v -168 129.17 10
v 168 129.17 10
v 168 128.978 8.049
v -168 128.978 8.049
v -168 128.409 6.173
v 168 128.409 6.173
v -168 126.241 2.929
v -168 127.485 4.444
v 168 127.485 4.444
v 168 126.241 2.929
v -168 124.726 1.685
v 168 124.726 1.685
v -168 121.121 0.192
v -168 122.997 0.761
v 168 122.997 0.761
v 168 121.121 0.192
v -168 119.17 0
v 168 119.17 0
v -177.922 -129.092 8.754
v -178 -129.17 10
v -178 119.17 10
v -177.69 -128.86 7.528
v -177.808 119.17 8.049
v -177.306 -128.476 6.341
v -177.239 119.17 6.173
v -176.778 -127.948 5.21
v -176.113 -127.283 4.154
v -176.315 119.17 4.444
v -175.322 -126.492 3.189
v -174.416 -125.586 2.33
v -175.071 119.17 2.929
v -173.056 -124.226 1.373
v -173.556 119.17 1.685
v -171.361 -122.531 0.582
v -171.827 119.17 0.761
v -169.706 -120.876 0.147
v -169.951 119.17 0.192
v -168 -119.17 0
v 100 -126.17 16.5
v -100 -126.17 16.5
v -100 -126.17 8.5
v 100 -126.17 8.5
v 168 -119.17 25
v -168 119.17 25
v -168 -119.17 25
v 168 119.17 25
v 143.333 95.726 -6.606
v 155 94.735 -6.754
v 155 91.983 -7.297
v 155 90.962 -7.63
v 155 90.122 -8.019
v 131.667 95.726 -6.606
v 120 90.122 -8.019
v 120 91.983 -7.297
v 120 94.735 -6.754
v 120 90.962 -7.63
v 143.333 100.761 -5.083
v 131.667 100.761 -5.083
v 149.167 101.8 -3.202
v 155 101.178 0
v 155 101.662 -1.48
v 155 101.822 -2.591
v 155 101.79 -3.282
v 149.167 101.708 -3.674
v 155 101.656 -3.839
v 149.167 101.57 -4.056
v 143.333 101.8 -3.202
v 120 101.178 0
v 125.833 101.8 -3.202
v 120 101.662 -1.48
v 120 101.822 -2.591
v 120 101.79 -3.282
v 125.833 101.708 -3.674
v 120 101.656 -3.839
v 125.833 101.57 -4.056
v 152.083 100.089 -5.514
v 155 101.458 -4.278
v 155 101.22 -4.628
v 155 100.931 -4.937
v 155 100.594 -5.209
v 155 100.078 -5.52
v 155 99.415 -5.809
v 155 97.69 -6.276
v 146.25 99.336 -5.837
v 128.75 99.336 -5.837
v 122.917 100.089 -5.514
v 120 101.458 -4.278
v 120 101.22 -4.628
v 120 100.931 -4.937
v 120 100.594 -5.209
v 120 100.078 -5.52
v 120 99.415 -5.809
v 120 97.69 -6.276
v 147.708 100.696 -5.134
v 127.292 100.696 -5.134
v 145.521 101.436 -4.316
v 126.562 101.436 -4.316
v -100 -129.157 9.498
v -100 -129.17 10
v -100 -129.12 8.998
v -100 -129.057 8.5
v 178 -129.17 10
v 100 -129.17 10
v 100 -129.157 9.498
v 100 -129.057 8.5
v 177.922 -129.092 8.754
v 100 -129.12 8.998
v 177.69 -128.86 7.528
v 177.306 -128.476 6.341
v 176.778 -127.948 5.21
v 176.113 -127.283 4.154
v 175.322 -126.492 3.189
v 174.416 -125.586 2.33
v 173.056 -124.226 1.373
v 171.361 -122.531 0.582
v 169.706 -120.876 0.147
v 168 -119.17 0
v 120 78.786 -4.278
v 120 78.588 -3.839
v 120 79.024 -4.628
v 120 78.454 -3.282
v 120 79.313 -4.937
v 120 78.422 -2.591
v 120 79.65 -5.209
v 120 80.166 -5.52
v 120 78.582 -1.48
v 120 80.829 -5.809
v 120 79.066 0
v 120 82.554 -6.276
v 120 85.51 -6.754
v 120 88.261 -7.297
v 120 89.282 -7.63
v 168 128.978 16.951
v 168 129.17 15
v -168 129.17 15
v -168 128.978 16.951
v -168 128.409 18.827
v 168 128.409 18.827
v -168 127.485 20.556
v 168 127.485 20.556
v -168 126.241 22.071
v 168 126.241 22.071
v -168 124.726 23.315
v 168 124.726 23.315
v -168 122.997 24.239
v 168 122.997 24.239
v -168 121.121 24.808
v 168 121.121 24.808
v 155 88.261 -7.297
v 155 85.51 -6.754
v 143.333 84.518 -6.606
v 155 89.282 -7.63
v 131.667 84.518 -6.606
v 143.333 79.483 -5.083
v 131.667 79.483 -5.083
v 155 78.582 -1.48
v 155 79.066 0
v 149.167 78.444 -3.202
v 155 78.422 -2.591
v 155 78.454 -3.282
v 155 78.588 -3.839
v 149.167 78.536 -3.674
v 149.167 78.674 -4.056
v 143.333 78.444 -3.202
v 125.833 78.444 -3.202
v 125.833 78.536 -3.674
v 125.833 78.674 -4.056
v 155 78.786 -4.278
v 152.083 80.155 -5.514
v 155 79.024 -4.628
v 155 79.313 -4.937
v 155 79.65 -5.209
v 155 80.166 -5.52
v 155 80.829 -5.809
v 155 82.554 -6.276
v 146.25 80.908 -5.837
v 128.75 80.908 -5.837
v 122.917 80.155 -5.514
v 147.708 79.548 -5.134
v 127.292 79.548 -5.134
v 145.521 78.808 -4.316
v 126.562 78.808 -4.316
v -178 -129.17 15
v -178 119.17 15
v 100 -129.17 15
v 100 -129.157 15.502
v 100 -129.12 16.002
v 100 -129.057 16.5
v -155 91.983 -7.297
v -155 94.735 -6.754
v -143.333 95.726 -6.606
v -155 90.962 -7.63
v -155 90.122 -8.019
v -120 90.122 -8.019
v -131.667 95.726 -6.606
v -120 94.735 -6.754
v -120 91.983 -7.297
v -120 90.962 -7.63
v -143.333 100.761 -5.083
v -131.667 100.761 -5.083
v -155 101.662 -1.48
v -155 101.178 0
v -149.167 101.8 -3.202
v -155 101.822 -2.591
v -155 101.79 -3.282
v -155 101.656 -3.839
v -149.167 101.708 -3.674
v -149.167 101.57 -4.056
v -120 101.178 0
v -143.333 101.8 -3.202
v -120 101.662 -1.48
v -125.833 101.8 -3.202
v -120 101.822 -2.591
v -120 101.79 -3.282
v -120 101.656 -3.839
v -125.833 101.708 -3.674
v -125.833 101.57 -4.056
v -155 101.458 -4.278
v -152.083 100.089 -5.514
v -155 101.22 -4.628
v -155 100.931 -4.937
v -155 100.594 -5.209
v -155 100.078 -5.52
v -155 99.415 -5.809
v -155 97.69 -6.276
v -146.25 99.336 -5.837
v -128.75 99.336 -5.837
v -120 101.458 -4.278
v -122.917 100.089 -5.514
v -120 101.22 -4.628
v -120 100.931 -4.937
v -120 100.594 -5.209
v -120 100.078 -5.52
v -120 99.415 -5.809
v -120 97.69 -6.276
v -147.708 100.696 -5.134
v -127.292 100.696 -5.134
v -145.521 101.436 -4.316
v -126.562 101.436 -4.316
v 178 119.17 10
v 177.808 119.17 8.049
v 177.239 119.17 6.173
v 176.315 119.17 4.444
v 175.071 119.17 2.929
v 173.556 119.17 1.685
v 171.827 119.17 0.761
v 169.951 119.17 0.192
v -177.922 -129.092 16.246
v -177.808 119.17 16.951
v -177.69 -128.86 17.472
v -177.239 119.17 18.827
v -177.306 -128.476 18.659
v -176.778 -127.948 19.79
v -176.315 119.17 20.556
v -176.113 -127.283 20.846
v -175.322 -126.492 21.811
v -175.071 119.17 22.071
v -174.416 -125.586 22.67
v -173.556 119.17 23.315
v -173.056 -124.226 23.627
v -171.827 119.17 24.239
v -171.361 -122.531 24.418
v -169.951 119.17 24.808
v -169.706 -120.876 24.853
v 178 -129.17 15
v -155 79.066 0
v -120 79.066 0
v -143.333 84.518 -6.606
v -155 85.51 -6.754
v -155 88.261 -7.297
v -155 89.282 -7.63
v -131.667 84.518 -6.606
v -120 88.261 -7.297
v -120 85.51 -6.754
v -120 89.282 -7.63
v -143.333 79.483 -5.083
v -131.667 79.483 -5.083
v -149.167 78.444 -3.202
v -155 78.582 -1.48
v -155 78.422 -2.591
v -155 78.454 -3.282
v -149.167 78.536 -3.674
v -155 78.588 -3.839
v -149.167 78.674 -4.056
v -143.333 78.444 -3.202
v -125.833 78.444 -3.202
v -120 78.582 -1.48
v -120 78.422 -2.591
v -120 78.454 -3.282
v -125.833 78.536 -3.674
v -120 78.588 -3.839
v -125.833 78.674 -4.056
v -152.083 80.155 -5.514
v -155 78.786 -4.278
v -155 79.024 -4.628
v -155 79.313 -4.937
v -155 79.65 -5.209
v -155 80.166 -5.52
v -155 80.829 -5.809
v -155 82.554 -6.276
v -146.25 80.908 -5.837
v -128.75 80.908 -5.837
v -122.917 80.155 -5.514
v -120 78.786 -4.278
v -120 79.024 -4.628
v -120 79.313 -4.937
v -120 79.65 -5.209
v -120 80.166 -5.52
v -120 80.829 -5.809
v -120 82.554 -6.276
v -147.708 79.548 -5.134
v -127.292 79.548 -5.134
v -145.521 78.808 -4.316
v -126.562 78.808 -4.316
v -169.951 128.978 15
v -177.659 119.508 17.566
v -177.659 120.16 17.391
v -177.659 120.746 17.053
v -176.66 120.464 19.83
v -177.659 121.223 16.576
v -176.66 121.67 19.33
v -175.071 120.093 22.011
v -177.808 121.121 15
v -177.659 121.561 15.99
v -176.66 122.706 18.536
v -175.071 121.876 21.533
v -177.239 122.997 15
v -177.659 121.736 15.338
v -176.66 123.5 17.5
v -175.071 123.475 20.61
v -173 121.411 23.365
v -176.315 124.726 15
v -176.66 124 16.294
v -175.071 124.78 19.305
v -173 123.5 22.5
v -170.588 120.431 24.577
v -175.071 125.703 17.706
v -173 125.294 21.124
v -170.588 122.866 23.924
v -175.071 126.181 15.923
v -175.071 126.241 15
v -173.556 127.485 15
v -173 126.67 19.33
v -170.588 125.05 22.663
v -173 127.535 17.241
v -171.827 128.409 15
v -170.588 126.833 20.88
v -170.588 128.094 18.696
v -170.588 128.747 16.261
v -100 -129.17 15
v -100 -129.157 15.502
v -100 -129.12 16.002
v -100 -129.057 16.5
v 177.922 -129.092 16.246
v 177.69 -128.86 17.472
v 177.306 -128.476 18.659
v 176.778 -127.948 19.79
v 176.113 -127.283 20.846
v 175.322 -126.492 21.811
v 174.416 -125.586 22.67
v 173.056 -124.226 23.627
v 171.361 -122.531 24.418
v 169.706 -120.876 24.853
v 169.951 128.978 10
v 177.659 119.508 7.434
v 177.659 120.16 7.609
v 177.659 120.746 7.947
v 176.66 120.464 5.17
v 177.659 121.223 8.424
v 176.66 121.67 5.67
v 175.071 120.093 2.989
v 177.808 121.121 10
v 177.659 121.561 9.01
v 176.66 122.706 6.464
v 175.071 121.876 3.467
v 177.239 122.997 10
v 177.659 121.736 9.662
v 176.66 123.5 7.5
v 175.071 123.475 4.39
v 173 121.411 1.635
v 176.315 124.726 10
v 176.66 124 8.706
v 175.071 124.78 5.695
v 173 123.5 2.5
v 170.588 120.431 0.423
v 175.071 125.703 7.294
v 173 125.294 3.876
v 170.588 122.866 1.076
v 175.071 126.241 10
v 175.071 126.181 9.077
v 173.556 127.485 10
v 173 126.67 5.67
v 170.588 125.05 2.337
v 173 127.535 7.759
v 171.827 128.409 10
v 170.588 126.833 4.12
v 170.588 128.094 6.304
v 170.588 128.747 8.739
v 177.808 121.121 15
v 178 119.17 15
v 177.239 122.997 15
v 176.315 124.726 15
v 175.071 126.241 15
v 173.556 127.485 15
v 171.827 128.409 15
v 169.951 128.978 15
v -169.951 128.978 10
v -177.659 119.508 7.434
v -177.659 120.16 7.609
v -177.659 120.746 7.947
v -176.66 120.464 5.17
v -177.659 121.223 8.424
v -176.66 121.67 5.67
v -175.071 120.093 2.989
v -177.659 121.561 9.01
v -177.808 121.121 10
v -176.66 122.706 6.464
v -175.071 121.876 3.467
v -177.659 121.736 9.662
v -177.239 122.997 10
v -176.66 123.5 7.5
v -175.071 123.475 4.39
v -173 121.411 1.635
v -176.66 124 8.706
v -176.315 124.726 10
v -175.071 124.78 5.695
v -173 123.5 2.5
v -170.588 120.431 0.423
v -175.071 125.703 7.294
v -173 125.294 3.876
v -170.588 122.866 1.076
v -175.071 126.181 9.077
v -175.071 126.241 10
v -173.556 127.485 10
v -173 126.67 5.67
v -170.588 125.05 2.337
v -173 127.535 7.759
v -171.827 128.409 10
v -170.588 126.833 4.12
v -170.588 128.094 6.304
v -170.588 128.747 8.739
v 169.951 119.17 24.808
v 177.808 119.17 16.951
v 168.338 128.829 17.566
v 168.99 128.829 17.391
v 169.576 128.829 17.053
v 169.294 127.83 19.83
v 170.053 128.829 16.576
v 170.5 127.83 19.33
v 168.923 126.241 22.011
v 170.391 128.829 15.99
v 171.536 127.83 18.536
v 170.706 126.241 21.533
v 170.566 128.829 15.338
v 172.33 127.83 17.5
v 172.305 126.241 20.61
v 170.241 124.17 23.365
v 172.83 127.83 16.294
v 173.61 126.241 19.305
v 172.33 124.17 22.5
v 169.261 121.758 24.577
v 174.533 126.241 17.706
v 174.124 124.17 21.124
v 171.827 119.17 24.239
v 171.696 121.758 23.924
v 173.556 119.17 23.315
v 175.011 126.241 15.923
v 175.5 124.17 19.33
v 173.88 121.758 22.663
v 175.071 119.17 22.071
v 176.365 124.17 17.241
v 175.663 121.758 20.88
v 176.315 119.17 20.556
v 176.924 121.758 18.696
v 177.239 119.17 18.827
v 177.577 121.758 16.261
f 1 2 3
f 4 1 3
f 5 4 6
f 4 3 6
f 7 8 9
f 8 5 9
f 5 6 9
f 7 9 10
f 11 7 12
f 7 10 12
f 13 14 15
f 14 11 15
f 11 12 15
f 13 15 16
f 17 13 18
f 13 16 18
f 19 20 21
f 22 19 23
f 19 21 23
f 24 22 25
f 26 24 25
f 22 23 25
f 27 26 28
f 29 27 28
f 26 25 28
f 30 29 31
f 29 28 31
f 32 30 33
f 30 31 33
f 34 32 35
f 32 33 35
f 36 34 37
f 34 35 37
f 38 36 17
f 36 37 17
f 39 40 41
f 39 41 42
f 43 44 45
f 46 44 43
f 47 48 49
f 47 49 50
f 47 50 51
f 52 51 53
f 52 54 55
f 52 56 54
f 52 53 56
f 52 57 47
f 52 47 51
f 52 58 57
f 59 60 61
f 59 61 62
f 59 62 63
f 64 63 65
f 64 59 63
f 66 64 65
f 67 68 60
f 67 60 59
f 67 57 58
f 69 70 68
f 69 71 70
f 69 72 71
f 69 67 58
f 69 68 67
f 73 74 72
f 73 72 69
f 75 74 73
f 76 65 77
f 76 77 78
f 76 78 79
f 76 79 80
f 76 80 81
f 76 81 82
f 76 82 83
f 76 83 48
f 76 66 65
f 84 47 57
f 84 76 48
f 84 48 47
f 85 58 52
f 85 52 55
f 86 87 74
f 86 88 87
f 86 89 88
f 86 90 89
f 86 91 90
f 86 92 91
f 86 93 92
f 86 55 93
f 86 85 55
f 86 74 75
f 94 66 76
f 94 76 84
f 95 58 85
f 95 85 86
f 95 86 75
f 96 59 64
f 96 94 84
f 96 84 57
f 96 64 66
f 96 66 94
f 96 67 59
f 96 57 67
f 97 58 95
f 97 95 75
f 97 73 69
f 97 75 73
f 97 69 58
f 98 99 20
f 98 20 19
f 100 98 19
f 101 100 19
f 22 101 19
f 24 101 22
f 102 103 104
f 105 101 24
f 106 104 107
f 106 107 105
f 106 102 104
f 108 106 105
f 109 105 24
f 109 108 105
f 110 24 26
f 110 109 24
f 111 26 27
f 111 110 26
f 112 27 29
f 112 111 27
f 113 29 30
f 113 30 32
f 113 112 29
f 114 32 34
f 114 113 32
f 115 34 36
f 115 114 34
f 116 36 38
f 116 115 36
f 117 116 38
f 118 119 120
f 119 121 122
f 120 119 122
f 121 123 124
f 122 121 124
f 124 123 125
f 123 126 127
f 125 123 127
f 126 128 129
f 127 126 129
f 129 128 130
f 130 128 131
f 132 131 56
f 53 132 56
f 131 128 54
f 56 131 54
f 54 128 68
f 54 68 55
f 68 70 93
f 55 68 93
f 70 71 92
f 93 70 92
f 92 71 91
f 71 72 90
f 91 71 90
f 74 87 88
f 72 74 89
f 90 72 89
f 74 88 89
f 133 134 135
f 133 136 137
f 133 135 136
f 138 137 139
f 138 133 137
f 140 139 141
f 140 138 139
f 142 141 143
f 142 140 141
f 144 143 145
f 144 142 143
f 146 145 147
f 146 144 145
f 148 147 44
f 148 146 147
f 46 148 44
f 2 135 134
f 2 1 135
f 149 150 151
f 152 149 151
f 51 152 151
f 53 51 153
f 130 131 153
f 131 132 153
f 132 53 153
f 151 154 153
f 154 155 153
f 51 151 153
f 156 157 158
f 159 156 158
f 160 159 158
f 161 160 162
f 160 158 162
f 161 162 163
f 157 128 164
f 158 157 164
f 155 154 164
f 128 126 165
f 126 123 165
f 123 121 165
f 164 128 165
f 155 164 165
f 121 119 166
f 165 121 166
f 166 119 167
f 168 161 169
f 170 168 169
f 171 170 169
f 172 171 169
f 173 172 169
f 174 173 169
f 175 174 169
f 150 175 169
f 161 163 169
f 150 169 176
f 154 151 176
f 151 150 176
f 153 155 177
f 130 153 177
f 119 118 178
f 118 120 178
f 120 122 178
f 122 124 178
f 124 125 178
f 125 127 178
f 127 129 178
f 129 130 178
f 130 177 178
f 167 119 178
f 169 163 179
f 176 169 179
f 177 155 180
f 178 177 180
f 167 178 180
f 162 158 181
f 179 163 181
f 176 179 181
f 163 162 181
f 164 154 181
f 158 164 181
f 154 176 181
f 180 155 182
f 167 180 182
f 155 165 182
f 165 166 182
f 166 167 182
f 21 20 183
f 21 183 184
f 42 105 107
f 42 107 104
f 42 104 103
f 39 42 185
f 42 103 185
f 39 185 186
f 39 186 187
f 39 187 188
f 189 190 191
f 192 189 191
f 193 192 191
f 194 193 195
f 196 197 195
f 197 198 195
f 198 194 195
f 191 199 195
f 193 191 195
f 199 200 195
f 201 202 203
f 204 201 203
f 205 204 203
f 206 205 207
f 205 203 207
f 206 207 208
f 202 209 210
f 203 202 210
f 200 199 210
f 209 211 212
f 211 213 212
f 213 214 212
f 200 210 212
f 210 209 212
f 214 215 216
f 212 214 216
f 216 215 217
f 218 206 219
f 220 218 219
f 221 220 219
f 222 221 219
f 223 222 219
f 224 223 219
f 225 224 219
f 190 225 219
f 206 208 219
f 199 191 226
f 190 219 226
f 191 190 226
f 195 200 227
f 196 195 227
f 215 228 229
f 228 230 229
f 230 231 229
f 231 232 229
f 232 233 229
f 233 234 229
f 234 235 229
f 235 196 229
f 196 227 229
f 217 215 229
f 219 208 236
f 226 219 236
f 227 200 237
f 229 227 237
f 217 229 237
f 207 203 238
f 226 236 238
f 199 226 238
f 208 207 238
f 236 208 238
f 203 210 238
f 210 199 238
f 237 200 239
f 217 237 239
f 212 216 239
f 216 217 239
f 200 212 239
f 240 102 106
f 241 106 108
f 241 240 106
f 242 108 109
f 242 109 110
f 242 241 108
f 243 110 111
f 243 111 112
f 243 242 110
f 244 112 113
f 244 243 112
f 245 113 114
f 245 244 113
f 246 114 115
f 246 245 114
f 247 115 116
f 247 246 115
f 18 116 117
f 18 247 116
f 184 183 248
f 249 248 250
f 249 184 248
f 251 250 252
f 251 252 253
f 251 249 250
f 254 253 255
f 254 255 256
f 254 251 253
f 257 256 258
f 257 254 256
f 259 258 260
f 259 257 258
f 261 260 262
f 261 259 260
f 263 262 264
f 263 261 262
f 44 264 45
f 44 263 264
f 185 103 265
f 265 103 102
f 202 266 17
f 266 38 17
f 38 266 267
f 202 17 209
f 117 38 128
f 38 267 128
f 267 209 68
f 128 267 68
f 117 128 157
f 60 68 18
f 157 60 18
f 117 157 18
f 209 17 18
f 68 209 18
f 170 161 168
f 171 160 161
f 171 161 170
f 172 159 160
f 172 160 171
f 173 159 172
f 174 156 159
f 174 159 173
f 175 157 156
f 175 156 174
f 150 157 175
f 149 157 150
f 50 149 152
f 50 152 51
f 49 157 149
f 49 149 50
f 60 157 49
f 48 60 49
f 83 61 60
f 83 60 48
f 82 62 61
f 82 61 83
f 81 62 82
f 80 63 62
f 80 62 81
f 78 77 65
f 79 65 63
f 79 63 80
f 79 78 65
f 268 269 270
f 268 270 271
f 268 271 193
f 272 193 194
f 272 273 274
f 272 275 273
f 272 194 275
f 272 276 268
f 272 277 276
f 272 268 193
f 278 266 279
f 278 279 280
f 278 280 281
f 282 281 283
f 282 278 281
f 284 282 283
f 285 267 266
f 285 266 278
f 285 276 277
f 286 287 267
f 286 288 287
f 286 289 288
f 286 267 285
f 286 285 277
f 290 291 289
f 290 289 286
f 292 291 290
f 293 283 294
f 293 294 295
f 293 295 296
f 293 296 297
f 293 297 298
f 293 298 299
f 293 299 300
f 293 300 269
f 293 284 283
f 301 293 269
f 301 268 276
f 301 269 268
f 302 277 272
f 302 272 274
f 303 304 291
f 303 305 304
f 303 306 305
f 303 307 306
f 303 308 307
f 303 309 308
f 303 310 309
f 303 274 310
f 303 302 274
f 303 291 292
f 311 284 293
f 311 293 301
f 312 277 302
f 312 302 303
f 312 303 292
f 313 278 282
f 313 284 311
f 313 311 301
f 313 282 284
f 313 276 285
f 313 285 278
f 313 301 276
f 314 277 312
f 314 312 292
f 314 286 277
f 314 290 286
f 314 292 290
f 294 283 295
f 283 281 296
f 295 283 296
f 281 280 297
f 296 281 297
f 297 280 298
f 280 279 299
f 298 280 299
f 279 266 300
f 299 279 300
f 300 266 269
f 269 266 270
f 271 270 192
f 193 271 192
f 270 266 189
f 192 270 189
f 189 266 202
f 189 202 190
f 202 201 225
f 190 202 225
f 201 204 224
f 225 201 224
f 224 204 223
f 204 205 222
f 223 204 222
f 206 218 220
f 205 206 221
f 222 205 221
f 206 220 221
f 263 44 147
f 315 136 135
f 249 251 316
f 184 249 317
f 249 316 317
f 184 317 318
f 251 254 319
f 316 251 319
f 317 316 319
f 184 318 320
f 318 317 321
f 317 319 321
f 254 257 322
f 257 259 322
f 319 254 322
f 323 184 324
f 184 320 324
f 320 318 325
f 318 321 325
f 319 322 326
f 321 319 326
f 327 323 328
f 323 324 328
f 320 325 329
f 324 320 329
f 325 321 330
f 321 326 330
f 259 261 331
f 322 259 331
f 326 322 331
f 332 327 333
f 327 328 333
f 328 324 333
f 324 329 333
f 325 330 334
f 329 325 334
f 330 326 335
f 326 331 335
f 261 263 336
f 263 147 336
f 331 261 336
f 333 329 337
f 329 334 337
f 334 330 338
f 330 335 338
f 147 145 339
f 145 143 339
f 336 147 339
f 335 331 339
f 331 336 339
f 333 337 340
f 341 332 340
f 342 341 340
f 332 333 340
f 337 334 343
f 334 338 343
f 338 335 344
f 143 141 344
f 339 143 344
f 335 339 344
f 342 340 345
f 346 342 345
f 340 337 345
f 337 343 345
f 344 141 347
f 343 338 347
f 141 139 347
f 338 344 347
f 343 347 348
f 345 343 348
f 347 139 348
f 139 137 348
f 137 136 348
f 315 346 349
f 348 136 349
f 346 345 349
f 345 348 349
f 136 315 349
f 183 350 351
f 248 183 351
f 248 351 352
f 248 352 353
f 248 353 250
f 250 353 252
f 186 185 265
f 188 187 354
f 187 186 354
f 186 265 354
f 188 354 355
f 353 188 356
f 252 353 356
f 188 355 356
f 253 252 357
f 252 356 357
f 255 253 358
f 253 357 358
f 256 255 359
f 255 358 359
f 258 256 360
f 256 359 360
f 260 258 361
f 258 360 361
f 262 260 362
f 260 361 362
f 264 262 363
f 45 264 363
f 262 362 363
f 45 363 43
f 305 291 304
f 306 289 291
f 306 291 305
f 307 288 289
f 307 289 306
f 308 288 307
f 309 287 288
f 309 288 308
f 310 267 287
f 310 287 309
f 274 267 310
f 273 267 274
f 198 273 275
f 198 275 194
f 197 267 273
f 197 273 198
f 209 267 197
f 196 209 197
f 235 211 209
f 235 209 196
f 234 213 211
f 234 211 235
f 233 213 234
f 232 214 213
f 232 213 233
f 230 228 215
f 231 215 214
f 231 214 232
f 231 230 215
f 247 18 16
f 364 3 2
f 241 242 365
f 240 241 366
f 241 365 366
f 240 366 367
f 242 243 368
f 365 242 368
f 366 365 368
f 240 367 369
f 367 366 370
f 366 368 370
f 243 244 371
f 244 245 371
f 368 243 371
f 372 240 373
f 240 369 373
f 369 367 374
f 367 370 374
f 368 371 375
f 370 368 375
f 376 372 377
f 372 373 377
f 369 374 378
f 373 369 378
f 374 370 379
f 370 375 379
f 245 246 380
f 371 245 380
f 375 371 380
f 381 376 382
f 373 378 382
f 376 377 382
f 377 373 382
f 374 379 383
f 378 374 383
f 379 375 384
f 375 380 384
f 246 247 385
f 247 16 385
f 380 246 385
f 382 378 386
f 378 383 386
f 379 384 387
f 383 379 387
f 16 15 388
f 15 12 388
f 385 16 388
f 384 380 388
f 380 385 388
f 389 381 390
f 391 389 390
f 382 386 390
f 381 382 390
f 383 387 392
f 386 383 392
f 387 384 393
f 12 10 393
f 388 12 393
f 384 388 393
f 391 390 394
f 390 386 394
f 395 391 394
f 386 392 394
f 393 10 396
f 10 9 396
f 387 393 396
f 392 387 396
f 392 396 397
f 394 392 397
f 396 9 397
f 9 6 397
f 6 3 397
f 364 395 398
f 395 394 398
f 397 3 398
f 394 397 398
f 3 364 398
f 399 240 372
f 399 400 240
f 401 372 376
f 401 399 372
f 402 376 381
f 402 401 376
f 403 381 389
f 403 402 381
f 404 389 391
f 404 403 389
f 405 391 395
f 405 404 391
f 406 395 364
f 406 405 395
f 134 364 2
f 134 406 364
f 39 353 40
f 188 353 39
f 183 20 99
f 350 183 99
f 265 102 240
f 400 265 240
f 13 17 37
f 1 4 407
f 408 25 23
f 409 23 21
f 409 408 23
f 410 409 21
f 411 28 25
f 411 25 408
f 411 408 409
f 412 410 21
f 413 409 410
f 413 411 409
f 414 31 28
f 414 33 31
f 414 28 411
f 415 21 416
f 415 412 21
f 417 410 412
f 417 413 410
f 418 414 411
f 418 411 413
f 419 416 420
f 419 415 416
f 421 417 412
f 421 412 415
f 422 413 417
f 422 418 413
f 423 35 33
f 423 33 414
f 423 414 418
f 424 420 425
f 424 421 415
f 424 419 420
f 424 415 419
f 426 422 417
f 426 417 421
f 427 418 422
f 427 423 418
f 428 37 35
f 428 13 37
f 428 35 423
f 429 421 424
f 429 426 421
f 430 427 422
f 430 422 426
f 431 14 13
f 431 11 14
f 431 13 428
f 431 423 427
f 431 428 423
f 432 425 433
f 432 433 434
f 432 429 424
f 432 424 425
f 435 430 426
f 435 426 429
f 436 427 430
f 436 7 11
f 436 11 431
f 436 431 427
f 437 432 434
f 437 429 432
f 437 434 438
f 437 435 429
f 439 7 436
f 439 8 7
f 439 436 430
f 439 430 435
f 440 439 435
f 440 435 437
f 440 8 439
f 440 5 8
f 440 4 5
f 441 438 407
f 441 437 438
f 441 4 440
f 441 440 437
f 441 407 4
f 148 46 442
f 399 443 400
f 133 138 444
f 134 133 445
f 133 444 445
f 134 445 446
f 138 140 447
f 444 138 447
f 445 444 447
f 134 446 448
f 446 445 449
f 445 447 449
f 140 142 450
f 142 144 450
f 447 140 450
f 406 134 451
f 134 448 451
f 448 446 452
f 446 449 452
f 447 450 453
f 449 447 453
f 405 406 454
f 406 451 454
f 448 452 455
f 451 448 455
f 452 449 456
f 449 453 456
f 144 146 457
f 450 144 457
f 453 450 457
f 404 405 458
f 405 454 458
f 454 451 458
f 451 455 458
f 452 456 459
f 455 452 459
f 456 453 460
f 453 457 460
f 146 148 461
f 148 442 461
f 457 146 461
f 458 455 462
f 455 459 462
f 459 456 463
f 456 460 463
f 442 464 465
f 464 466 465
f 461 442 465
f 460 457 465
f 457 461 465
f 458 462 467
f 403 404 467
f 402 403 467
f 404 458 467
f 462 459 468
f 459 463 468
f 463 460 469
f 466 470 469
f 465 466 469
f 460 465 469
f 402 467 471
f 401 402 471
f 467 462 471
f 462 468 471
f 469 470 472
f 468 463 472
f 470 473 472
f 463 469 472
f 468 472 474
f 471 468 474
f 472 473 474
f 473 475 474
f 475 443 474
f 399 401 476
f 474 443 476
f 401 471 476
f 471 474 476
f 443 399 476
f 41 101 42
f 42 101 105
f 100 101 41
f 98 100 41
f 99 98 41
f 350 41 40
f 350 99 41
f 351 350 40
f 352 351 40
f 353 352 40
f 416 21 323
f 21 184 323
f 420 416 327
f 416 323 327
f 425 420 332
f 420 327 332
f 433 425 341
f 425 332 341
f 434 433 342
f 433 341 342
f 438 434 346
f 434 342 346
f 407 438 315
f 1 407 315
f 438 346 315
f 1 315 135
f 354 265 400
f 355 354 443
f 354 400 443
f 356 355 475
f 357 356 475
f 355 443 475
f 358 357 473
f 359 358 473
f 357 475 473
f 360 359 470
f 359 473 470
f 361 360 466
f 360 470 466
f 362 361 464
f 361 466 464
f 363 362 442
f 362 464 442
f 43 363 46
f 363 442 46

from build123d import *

# Parameters (mm, degrees)
ESQUISSE1_W             = 356
ESQUISSE1_H             = 258.34
BOSS_EXTRU_1_DEPTH      = 25
CONG_1_R                = 10
BOSS_EXTRU_2_DEPTH      = 35
ESQUISSE4_W             = 200
ESQUISSE4_H             = 8
ENL_V_MAT_EXTRU_1_DEPTH = 3


with BuildPart() as part:
    # Esquisse1 → Boss.-Extru.1 (new body)
    with BuildSketch(Plane.XY):
        Rectangle(ESQUISSE1_W, ESQUISSE1_H)
    extrude(amount=BOSS_EXTRU_1_DEPTH)

    # Congé1
    cong_1_edges = [part.edges().sort_by_distance(p)[0] for p in [
        (178, 0, 25),
        (0, 129.17, 25),
        (-178, 0, 25),
        (0, 129.17, 0),
        (178, 0, 0),
        (0, -129.17, 0),
        (-178, 0, 0),
        (-178, 129.17, 12.5),
        (178, 129.17, 12.5),
        (0, -129.17, 25),
    ]]
    fillet(cong_1_edges, radius=CONG_1_R)

    # Esquisse3 → Boss.-Extru.2 (add)
    with BuildSketch(Plane(origin=(120, 0, 0), x_dir=(0, 0, -1), z_dir=(1, 0, 0))):
        with BuildLine():
            Line((0, 101.177924123), (0, 79.066125458))
            add(Edge.make_bspline(
                [(0, 79.066125458), (8.012390786, 75.823605097), (5.511301078, 85.583926919), (8.019330137, 90.12202479)],
                knots=[0, 0, 0, 0, 1, 1, 1, 1], degree=3))
            add(Edge.make_bspline(
                [(0, 101.177924123), (8.012390786, 104.420444484), (5.511301078, 94.660122661), (8.019330137, 90.12202479)],
                knots=[0, 0, 0, 0, 1, 1, 1, 1], degree=3))
        make_face()
    boss_extru_2 = extrude(amount=BOSS_EXTRU_2_DEPTH)

    # Symétrie1: Boss.-Extru.2 across plane
    add(boss_extru_2.mirror(Plane(origin=(0, 0, 0), x_dir=(0, 0, 1), z_dir=(1, 0, 0))))

    # Esquisse4 → Enlèv. mat.-Extru.1 (cut)
    with BuildSketch(Plane.XZ.offset(129.17)):
        with Locations((0, 12.5)):
            Rectangle(ESQUISSE4_W, ESQUISSE4_H)
    extrude(amount=-ENL_V_MAT_EXTRU_1_DEPTH, mode=Mode.SUBTRACT)


solid = part.part
